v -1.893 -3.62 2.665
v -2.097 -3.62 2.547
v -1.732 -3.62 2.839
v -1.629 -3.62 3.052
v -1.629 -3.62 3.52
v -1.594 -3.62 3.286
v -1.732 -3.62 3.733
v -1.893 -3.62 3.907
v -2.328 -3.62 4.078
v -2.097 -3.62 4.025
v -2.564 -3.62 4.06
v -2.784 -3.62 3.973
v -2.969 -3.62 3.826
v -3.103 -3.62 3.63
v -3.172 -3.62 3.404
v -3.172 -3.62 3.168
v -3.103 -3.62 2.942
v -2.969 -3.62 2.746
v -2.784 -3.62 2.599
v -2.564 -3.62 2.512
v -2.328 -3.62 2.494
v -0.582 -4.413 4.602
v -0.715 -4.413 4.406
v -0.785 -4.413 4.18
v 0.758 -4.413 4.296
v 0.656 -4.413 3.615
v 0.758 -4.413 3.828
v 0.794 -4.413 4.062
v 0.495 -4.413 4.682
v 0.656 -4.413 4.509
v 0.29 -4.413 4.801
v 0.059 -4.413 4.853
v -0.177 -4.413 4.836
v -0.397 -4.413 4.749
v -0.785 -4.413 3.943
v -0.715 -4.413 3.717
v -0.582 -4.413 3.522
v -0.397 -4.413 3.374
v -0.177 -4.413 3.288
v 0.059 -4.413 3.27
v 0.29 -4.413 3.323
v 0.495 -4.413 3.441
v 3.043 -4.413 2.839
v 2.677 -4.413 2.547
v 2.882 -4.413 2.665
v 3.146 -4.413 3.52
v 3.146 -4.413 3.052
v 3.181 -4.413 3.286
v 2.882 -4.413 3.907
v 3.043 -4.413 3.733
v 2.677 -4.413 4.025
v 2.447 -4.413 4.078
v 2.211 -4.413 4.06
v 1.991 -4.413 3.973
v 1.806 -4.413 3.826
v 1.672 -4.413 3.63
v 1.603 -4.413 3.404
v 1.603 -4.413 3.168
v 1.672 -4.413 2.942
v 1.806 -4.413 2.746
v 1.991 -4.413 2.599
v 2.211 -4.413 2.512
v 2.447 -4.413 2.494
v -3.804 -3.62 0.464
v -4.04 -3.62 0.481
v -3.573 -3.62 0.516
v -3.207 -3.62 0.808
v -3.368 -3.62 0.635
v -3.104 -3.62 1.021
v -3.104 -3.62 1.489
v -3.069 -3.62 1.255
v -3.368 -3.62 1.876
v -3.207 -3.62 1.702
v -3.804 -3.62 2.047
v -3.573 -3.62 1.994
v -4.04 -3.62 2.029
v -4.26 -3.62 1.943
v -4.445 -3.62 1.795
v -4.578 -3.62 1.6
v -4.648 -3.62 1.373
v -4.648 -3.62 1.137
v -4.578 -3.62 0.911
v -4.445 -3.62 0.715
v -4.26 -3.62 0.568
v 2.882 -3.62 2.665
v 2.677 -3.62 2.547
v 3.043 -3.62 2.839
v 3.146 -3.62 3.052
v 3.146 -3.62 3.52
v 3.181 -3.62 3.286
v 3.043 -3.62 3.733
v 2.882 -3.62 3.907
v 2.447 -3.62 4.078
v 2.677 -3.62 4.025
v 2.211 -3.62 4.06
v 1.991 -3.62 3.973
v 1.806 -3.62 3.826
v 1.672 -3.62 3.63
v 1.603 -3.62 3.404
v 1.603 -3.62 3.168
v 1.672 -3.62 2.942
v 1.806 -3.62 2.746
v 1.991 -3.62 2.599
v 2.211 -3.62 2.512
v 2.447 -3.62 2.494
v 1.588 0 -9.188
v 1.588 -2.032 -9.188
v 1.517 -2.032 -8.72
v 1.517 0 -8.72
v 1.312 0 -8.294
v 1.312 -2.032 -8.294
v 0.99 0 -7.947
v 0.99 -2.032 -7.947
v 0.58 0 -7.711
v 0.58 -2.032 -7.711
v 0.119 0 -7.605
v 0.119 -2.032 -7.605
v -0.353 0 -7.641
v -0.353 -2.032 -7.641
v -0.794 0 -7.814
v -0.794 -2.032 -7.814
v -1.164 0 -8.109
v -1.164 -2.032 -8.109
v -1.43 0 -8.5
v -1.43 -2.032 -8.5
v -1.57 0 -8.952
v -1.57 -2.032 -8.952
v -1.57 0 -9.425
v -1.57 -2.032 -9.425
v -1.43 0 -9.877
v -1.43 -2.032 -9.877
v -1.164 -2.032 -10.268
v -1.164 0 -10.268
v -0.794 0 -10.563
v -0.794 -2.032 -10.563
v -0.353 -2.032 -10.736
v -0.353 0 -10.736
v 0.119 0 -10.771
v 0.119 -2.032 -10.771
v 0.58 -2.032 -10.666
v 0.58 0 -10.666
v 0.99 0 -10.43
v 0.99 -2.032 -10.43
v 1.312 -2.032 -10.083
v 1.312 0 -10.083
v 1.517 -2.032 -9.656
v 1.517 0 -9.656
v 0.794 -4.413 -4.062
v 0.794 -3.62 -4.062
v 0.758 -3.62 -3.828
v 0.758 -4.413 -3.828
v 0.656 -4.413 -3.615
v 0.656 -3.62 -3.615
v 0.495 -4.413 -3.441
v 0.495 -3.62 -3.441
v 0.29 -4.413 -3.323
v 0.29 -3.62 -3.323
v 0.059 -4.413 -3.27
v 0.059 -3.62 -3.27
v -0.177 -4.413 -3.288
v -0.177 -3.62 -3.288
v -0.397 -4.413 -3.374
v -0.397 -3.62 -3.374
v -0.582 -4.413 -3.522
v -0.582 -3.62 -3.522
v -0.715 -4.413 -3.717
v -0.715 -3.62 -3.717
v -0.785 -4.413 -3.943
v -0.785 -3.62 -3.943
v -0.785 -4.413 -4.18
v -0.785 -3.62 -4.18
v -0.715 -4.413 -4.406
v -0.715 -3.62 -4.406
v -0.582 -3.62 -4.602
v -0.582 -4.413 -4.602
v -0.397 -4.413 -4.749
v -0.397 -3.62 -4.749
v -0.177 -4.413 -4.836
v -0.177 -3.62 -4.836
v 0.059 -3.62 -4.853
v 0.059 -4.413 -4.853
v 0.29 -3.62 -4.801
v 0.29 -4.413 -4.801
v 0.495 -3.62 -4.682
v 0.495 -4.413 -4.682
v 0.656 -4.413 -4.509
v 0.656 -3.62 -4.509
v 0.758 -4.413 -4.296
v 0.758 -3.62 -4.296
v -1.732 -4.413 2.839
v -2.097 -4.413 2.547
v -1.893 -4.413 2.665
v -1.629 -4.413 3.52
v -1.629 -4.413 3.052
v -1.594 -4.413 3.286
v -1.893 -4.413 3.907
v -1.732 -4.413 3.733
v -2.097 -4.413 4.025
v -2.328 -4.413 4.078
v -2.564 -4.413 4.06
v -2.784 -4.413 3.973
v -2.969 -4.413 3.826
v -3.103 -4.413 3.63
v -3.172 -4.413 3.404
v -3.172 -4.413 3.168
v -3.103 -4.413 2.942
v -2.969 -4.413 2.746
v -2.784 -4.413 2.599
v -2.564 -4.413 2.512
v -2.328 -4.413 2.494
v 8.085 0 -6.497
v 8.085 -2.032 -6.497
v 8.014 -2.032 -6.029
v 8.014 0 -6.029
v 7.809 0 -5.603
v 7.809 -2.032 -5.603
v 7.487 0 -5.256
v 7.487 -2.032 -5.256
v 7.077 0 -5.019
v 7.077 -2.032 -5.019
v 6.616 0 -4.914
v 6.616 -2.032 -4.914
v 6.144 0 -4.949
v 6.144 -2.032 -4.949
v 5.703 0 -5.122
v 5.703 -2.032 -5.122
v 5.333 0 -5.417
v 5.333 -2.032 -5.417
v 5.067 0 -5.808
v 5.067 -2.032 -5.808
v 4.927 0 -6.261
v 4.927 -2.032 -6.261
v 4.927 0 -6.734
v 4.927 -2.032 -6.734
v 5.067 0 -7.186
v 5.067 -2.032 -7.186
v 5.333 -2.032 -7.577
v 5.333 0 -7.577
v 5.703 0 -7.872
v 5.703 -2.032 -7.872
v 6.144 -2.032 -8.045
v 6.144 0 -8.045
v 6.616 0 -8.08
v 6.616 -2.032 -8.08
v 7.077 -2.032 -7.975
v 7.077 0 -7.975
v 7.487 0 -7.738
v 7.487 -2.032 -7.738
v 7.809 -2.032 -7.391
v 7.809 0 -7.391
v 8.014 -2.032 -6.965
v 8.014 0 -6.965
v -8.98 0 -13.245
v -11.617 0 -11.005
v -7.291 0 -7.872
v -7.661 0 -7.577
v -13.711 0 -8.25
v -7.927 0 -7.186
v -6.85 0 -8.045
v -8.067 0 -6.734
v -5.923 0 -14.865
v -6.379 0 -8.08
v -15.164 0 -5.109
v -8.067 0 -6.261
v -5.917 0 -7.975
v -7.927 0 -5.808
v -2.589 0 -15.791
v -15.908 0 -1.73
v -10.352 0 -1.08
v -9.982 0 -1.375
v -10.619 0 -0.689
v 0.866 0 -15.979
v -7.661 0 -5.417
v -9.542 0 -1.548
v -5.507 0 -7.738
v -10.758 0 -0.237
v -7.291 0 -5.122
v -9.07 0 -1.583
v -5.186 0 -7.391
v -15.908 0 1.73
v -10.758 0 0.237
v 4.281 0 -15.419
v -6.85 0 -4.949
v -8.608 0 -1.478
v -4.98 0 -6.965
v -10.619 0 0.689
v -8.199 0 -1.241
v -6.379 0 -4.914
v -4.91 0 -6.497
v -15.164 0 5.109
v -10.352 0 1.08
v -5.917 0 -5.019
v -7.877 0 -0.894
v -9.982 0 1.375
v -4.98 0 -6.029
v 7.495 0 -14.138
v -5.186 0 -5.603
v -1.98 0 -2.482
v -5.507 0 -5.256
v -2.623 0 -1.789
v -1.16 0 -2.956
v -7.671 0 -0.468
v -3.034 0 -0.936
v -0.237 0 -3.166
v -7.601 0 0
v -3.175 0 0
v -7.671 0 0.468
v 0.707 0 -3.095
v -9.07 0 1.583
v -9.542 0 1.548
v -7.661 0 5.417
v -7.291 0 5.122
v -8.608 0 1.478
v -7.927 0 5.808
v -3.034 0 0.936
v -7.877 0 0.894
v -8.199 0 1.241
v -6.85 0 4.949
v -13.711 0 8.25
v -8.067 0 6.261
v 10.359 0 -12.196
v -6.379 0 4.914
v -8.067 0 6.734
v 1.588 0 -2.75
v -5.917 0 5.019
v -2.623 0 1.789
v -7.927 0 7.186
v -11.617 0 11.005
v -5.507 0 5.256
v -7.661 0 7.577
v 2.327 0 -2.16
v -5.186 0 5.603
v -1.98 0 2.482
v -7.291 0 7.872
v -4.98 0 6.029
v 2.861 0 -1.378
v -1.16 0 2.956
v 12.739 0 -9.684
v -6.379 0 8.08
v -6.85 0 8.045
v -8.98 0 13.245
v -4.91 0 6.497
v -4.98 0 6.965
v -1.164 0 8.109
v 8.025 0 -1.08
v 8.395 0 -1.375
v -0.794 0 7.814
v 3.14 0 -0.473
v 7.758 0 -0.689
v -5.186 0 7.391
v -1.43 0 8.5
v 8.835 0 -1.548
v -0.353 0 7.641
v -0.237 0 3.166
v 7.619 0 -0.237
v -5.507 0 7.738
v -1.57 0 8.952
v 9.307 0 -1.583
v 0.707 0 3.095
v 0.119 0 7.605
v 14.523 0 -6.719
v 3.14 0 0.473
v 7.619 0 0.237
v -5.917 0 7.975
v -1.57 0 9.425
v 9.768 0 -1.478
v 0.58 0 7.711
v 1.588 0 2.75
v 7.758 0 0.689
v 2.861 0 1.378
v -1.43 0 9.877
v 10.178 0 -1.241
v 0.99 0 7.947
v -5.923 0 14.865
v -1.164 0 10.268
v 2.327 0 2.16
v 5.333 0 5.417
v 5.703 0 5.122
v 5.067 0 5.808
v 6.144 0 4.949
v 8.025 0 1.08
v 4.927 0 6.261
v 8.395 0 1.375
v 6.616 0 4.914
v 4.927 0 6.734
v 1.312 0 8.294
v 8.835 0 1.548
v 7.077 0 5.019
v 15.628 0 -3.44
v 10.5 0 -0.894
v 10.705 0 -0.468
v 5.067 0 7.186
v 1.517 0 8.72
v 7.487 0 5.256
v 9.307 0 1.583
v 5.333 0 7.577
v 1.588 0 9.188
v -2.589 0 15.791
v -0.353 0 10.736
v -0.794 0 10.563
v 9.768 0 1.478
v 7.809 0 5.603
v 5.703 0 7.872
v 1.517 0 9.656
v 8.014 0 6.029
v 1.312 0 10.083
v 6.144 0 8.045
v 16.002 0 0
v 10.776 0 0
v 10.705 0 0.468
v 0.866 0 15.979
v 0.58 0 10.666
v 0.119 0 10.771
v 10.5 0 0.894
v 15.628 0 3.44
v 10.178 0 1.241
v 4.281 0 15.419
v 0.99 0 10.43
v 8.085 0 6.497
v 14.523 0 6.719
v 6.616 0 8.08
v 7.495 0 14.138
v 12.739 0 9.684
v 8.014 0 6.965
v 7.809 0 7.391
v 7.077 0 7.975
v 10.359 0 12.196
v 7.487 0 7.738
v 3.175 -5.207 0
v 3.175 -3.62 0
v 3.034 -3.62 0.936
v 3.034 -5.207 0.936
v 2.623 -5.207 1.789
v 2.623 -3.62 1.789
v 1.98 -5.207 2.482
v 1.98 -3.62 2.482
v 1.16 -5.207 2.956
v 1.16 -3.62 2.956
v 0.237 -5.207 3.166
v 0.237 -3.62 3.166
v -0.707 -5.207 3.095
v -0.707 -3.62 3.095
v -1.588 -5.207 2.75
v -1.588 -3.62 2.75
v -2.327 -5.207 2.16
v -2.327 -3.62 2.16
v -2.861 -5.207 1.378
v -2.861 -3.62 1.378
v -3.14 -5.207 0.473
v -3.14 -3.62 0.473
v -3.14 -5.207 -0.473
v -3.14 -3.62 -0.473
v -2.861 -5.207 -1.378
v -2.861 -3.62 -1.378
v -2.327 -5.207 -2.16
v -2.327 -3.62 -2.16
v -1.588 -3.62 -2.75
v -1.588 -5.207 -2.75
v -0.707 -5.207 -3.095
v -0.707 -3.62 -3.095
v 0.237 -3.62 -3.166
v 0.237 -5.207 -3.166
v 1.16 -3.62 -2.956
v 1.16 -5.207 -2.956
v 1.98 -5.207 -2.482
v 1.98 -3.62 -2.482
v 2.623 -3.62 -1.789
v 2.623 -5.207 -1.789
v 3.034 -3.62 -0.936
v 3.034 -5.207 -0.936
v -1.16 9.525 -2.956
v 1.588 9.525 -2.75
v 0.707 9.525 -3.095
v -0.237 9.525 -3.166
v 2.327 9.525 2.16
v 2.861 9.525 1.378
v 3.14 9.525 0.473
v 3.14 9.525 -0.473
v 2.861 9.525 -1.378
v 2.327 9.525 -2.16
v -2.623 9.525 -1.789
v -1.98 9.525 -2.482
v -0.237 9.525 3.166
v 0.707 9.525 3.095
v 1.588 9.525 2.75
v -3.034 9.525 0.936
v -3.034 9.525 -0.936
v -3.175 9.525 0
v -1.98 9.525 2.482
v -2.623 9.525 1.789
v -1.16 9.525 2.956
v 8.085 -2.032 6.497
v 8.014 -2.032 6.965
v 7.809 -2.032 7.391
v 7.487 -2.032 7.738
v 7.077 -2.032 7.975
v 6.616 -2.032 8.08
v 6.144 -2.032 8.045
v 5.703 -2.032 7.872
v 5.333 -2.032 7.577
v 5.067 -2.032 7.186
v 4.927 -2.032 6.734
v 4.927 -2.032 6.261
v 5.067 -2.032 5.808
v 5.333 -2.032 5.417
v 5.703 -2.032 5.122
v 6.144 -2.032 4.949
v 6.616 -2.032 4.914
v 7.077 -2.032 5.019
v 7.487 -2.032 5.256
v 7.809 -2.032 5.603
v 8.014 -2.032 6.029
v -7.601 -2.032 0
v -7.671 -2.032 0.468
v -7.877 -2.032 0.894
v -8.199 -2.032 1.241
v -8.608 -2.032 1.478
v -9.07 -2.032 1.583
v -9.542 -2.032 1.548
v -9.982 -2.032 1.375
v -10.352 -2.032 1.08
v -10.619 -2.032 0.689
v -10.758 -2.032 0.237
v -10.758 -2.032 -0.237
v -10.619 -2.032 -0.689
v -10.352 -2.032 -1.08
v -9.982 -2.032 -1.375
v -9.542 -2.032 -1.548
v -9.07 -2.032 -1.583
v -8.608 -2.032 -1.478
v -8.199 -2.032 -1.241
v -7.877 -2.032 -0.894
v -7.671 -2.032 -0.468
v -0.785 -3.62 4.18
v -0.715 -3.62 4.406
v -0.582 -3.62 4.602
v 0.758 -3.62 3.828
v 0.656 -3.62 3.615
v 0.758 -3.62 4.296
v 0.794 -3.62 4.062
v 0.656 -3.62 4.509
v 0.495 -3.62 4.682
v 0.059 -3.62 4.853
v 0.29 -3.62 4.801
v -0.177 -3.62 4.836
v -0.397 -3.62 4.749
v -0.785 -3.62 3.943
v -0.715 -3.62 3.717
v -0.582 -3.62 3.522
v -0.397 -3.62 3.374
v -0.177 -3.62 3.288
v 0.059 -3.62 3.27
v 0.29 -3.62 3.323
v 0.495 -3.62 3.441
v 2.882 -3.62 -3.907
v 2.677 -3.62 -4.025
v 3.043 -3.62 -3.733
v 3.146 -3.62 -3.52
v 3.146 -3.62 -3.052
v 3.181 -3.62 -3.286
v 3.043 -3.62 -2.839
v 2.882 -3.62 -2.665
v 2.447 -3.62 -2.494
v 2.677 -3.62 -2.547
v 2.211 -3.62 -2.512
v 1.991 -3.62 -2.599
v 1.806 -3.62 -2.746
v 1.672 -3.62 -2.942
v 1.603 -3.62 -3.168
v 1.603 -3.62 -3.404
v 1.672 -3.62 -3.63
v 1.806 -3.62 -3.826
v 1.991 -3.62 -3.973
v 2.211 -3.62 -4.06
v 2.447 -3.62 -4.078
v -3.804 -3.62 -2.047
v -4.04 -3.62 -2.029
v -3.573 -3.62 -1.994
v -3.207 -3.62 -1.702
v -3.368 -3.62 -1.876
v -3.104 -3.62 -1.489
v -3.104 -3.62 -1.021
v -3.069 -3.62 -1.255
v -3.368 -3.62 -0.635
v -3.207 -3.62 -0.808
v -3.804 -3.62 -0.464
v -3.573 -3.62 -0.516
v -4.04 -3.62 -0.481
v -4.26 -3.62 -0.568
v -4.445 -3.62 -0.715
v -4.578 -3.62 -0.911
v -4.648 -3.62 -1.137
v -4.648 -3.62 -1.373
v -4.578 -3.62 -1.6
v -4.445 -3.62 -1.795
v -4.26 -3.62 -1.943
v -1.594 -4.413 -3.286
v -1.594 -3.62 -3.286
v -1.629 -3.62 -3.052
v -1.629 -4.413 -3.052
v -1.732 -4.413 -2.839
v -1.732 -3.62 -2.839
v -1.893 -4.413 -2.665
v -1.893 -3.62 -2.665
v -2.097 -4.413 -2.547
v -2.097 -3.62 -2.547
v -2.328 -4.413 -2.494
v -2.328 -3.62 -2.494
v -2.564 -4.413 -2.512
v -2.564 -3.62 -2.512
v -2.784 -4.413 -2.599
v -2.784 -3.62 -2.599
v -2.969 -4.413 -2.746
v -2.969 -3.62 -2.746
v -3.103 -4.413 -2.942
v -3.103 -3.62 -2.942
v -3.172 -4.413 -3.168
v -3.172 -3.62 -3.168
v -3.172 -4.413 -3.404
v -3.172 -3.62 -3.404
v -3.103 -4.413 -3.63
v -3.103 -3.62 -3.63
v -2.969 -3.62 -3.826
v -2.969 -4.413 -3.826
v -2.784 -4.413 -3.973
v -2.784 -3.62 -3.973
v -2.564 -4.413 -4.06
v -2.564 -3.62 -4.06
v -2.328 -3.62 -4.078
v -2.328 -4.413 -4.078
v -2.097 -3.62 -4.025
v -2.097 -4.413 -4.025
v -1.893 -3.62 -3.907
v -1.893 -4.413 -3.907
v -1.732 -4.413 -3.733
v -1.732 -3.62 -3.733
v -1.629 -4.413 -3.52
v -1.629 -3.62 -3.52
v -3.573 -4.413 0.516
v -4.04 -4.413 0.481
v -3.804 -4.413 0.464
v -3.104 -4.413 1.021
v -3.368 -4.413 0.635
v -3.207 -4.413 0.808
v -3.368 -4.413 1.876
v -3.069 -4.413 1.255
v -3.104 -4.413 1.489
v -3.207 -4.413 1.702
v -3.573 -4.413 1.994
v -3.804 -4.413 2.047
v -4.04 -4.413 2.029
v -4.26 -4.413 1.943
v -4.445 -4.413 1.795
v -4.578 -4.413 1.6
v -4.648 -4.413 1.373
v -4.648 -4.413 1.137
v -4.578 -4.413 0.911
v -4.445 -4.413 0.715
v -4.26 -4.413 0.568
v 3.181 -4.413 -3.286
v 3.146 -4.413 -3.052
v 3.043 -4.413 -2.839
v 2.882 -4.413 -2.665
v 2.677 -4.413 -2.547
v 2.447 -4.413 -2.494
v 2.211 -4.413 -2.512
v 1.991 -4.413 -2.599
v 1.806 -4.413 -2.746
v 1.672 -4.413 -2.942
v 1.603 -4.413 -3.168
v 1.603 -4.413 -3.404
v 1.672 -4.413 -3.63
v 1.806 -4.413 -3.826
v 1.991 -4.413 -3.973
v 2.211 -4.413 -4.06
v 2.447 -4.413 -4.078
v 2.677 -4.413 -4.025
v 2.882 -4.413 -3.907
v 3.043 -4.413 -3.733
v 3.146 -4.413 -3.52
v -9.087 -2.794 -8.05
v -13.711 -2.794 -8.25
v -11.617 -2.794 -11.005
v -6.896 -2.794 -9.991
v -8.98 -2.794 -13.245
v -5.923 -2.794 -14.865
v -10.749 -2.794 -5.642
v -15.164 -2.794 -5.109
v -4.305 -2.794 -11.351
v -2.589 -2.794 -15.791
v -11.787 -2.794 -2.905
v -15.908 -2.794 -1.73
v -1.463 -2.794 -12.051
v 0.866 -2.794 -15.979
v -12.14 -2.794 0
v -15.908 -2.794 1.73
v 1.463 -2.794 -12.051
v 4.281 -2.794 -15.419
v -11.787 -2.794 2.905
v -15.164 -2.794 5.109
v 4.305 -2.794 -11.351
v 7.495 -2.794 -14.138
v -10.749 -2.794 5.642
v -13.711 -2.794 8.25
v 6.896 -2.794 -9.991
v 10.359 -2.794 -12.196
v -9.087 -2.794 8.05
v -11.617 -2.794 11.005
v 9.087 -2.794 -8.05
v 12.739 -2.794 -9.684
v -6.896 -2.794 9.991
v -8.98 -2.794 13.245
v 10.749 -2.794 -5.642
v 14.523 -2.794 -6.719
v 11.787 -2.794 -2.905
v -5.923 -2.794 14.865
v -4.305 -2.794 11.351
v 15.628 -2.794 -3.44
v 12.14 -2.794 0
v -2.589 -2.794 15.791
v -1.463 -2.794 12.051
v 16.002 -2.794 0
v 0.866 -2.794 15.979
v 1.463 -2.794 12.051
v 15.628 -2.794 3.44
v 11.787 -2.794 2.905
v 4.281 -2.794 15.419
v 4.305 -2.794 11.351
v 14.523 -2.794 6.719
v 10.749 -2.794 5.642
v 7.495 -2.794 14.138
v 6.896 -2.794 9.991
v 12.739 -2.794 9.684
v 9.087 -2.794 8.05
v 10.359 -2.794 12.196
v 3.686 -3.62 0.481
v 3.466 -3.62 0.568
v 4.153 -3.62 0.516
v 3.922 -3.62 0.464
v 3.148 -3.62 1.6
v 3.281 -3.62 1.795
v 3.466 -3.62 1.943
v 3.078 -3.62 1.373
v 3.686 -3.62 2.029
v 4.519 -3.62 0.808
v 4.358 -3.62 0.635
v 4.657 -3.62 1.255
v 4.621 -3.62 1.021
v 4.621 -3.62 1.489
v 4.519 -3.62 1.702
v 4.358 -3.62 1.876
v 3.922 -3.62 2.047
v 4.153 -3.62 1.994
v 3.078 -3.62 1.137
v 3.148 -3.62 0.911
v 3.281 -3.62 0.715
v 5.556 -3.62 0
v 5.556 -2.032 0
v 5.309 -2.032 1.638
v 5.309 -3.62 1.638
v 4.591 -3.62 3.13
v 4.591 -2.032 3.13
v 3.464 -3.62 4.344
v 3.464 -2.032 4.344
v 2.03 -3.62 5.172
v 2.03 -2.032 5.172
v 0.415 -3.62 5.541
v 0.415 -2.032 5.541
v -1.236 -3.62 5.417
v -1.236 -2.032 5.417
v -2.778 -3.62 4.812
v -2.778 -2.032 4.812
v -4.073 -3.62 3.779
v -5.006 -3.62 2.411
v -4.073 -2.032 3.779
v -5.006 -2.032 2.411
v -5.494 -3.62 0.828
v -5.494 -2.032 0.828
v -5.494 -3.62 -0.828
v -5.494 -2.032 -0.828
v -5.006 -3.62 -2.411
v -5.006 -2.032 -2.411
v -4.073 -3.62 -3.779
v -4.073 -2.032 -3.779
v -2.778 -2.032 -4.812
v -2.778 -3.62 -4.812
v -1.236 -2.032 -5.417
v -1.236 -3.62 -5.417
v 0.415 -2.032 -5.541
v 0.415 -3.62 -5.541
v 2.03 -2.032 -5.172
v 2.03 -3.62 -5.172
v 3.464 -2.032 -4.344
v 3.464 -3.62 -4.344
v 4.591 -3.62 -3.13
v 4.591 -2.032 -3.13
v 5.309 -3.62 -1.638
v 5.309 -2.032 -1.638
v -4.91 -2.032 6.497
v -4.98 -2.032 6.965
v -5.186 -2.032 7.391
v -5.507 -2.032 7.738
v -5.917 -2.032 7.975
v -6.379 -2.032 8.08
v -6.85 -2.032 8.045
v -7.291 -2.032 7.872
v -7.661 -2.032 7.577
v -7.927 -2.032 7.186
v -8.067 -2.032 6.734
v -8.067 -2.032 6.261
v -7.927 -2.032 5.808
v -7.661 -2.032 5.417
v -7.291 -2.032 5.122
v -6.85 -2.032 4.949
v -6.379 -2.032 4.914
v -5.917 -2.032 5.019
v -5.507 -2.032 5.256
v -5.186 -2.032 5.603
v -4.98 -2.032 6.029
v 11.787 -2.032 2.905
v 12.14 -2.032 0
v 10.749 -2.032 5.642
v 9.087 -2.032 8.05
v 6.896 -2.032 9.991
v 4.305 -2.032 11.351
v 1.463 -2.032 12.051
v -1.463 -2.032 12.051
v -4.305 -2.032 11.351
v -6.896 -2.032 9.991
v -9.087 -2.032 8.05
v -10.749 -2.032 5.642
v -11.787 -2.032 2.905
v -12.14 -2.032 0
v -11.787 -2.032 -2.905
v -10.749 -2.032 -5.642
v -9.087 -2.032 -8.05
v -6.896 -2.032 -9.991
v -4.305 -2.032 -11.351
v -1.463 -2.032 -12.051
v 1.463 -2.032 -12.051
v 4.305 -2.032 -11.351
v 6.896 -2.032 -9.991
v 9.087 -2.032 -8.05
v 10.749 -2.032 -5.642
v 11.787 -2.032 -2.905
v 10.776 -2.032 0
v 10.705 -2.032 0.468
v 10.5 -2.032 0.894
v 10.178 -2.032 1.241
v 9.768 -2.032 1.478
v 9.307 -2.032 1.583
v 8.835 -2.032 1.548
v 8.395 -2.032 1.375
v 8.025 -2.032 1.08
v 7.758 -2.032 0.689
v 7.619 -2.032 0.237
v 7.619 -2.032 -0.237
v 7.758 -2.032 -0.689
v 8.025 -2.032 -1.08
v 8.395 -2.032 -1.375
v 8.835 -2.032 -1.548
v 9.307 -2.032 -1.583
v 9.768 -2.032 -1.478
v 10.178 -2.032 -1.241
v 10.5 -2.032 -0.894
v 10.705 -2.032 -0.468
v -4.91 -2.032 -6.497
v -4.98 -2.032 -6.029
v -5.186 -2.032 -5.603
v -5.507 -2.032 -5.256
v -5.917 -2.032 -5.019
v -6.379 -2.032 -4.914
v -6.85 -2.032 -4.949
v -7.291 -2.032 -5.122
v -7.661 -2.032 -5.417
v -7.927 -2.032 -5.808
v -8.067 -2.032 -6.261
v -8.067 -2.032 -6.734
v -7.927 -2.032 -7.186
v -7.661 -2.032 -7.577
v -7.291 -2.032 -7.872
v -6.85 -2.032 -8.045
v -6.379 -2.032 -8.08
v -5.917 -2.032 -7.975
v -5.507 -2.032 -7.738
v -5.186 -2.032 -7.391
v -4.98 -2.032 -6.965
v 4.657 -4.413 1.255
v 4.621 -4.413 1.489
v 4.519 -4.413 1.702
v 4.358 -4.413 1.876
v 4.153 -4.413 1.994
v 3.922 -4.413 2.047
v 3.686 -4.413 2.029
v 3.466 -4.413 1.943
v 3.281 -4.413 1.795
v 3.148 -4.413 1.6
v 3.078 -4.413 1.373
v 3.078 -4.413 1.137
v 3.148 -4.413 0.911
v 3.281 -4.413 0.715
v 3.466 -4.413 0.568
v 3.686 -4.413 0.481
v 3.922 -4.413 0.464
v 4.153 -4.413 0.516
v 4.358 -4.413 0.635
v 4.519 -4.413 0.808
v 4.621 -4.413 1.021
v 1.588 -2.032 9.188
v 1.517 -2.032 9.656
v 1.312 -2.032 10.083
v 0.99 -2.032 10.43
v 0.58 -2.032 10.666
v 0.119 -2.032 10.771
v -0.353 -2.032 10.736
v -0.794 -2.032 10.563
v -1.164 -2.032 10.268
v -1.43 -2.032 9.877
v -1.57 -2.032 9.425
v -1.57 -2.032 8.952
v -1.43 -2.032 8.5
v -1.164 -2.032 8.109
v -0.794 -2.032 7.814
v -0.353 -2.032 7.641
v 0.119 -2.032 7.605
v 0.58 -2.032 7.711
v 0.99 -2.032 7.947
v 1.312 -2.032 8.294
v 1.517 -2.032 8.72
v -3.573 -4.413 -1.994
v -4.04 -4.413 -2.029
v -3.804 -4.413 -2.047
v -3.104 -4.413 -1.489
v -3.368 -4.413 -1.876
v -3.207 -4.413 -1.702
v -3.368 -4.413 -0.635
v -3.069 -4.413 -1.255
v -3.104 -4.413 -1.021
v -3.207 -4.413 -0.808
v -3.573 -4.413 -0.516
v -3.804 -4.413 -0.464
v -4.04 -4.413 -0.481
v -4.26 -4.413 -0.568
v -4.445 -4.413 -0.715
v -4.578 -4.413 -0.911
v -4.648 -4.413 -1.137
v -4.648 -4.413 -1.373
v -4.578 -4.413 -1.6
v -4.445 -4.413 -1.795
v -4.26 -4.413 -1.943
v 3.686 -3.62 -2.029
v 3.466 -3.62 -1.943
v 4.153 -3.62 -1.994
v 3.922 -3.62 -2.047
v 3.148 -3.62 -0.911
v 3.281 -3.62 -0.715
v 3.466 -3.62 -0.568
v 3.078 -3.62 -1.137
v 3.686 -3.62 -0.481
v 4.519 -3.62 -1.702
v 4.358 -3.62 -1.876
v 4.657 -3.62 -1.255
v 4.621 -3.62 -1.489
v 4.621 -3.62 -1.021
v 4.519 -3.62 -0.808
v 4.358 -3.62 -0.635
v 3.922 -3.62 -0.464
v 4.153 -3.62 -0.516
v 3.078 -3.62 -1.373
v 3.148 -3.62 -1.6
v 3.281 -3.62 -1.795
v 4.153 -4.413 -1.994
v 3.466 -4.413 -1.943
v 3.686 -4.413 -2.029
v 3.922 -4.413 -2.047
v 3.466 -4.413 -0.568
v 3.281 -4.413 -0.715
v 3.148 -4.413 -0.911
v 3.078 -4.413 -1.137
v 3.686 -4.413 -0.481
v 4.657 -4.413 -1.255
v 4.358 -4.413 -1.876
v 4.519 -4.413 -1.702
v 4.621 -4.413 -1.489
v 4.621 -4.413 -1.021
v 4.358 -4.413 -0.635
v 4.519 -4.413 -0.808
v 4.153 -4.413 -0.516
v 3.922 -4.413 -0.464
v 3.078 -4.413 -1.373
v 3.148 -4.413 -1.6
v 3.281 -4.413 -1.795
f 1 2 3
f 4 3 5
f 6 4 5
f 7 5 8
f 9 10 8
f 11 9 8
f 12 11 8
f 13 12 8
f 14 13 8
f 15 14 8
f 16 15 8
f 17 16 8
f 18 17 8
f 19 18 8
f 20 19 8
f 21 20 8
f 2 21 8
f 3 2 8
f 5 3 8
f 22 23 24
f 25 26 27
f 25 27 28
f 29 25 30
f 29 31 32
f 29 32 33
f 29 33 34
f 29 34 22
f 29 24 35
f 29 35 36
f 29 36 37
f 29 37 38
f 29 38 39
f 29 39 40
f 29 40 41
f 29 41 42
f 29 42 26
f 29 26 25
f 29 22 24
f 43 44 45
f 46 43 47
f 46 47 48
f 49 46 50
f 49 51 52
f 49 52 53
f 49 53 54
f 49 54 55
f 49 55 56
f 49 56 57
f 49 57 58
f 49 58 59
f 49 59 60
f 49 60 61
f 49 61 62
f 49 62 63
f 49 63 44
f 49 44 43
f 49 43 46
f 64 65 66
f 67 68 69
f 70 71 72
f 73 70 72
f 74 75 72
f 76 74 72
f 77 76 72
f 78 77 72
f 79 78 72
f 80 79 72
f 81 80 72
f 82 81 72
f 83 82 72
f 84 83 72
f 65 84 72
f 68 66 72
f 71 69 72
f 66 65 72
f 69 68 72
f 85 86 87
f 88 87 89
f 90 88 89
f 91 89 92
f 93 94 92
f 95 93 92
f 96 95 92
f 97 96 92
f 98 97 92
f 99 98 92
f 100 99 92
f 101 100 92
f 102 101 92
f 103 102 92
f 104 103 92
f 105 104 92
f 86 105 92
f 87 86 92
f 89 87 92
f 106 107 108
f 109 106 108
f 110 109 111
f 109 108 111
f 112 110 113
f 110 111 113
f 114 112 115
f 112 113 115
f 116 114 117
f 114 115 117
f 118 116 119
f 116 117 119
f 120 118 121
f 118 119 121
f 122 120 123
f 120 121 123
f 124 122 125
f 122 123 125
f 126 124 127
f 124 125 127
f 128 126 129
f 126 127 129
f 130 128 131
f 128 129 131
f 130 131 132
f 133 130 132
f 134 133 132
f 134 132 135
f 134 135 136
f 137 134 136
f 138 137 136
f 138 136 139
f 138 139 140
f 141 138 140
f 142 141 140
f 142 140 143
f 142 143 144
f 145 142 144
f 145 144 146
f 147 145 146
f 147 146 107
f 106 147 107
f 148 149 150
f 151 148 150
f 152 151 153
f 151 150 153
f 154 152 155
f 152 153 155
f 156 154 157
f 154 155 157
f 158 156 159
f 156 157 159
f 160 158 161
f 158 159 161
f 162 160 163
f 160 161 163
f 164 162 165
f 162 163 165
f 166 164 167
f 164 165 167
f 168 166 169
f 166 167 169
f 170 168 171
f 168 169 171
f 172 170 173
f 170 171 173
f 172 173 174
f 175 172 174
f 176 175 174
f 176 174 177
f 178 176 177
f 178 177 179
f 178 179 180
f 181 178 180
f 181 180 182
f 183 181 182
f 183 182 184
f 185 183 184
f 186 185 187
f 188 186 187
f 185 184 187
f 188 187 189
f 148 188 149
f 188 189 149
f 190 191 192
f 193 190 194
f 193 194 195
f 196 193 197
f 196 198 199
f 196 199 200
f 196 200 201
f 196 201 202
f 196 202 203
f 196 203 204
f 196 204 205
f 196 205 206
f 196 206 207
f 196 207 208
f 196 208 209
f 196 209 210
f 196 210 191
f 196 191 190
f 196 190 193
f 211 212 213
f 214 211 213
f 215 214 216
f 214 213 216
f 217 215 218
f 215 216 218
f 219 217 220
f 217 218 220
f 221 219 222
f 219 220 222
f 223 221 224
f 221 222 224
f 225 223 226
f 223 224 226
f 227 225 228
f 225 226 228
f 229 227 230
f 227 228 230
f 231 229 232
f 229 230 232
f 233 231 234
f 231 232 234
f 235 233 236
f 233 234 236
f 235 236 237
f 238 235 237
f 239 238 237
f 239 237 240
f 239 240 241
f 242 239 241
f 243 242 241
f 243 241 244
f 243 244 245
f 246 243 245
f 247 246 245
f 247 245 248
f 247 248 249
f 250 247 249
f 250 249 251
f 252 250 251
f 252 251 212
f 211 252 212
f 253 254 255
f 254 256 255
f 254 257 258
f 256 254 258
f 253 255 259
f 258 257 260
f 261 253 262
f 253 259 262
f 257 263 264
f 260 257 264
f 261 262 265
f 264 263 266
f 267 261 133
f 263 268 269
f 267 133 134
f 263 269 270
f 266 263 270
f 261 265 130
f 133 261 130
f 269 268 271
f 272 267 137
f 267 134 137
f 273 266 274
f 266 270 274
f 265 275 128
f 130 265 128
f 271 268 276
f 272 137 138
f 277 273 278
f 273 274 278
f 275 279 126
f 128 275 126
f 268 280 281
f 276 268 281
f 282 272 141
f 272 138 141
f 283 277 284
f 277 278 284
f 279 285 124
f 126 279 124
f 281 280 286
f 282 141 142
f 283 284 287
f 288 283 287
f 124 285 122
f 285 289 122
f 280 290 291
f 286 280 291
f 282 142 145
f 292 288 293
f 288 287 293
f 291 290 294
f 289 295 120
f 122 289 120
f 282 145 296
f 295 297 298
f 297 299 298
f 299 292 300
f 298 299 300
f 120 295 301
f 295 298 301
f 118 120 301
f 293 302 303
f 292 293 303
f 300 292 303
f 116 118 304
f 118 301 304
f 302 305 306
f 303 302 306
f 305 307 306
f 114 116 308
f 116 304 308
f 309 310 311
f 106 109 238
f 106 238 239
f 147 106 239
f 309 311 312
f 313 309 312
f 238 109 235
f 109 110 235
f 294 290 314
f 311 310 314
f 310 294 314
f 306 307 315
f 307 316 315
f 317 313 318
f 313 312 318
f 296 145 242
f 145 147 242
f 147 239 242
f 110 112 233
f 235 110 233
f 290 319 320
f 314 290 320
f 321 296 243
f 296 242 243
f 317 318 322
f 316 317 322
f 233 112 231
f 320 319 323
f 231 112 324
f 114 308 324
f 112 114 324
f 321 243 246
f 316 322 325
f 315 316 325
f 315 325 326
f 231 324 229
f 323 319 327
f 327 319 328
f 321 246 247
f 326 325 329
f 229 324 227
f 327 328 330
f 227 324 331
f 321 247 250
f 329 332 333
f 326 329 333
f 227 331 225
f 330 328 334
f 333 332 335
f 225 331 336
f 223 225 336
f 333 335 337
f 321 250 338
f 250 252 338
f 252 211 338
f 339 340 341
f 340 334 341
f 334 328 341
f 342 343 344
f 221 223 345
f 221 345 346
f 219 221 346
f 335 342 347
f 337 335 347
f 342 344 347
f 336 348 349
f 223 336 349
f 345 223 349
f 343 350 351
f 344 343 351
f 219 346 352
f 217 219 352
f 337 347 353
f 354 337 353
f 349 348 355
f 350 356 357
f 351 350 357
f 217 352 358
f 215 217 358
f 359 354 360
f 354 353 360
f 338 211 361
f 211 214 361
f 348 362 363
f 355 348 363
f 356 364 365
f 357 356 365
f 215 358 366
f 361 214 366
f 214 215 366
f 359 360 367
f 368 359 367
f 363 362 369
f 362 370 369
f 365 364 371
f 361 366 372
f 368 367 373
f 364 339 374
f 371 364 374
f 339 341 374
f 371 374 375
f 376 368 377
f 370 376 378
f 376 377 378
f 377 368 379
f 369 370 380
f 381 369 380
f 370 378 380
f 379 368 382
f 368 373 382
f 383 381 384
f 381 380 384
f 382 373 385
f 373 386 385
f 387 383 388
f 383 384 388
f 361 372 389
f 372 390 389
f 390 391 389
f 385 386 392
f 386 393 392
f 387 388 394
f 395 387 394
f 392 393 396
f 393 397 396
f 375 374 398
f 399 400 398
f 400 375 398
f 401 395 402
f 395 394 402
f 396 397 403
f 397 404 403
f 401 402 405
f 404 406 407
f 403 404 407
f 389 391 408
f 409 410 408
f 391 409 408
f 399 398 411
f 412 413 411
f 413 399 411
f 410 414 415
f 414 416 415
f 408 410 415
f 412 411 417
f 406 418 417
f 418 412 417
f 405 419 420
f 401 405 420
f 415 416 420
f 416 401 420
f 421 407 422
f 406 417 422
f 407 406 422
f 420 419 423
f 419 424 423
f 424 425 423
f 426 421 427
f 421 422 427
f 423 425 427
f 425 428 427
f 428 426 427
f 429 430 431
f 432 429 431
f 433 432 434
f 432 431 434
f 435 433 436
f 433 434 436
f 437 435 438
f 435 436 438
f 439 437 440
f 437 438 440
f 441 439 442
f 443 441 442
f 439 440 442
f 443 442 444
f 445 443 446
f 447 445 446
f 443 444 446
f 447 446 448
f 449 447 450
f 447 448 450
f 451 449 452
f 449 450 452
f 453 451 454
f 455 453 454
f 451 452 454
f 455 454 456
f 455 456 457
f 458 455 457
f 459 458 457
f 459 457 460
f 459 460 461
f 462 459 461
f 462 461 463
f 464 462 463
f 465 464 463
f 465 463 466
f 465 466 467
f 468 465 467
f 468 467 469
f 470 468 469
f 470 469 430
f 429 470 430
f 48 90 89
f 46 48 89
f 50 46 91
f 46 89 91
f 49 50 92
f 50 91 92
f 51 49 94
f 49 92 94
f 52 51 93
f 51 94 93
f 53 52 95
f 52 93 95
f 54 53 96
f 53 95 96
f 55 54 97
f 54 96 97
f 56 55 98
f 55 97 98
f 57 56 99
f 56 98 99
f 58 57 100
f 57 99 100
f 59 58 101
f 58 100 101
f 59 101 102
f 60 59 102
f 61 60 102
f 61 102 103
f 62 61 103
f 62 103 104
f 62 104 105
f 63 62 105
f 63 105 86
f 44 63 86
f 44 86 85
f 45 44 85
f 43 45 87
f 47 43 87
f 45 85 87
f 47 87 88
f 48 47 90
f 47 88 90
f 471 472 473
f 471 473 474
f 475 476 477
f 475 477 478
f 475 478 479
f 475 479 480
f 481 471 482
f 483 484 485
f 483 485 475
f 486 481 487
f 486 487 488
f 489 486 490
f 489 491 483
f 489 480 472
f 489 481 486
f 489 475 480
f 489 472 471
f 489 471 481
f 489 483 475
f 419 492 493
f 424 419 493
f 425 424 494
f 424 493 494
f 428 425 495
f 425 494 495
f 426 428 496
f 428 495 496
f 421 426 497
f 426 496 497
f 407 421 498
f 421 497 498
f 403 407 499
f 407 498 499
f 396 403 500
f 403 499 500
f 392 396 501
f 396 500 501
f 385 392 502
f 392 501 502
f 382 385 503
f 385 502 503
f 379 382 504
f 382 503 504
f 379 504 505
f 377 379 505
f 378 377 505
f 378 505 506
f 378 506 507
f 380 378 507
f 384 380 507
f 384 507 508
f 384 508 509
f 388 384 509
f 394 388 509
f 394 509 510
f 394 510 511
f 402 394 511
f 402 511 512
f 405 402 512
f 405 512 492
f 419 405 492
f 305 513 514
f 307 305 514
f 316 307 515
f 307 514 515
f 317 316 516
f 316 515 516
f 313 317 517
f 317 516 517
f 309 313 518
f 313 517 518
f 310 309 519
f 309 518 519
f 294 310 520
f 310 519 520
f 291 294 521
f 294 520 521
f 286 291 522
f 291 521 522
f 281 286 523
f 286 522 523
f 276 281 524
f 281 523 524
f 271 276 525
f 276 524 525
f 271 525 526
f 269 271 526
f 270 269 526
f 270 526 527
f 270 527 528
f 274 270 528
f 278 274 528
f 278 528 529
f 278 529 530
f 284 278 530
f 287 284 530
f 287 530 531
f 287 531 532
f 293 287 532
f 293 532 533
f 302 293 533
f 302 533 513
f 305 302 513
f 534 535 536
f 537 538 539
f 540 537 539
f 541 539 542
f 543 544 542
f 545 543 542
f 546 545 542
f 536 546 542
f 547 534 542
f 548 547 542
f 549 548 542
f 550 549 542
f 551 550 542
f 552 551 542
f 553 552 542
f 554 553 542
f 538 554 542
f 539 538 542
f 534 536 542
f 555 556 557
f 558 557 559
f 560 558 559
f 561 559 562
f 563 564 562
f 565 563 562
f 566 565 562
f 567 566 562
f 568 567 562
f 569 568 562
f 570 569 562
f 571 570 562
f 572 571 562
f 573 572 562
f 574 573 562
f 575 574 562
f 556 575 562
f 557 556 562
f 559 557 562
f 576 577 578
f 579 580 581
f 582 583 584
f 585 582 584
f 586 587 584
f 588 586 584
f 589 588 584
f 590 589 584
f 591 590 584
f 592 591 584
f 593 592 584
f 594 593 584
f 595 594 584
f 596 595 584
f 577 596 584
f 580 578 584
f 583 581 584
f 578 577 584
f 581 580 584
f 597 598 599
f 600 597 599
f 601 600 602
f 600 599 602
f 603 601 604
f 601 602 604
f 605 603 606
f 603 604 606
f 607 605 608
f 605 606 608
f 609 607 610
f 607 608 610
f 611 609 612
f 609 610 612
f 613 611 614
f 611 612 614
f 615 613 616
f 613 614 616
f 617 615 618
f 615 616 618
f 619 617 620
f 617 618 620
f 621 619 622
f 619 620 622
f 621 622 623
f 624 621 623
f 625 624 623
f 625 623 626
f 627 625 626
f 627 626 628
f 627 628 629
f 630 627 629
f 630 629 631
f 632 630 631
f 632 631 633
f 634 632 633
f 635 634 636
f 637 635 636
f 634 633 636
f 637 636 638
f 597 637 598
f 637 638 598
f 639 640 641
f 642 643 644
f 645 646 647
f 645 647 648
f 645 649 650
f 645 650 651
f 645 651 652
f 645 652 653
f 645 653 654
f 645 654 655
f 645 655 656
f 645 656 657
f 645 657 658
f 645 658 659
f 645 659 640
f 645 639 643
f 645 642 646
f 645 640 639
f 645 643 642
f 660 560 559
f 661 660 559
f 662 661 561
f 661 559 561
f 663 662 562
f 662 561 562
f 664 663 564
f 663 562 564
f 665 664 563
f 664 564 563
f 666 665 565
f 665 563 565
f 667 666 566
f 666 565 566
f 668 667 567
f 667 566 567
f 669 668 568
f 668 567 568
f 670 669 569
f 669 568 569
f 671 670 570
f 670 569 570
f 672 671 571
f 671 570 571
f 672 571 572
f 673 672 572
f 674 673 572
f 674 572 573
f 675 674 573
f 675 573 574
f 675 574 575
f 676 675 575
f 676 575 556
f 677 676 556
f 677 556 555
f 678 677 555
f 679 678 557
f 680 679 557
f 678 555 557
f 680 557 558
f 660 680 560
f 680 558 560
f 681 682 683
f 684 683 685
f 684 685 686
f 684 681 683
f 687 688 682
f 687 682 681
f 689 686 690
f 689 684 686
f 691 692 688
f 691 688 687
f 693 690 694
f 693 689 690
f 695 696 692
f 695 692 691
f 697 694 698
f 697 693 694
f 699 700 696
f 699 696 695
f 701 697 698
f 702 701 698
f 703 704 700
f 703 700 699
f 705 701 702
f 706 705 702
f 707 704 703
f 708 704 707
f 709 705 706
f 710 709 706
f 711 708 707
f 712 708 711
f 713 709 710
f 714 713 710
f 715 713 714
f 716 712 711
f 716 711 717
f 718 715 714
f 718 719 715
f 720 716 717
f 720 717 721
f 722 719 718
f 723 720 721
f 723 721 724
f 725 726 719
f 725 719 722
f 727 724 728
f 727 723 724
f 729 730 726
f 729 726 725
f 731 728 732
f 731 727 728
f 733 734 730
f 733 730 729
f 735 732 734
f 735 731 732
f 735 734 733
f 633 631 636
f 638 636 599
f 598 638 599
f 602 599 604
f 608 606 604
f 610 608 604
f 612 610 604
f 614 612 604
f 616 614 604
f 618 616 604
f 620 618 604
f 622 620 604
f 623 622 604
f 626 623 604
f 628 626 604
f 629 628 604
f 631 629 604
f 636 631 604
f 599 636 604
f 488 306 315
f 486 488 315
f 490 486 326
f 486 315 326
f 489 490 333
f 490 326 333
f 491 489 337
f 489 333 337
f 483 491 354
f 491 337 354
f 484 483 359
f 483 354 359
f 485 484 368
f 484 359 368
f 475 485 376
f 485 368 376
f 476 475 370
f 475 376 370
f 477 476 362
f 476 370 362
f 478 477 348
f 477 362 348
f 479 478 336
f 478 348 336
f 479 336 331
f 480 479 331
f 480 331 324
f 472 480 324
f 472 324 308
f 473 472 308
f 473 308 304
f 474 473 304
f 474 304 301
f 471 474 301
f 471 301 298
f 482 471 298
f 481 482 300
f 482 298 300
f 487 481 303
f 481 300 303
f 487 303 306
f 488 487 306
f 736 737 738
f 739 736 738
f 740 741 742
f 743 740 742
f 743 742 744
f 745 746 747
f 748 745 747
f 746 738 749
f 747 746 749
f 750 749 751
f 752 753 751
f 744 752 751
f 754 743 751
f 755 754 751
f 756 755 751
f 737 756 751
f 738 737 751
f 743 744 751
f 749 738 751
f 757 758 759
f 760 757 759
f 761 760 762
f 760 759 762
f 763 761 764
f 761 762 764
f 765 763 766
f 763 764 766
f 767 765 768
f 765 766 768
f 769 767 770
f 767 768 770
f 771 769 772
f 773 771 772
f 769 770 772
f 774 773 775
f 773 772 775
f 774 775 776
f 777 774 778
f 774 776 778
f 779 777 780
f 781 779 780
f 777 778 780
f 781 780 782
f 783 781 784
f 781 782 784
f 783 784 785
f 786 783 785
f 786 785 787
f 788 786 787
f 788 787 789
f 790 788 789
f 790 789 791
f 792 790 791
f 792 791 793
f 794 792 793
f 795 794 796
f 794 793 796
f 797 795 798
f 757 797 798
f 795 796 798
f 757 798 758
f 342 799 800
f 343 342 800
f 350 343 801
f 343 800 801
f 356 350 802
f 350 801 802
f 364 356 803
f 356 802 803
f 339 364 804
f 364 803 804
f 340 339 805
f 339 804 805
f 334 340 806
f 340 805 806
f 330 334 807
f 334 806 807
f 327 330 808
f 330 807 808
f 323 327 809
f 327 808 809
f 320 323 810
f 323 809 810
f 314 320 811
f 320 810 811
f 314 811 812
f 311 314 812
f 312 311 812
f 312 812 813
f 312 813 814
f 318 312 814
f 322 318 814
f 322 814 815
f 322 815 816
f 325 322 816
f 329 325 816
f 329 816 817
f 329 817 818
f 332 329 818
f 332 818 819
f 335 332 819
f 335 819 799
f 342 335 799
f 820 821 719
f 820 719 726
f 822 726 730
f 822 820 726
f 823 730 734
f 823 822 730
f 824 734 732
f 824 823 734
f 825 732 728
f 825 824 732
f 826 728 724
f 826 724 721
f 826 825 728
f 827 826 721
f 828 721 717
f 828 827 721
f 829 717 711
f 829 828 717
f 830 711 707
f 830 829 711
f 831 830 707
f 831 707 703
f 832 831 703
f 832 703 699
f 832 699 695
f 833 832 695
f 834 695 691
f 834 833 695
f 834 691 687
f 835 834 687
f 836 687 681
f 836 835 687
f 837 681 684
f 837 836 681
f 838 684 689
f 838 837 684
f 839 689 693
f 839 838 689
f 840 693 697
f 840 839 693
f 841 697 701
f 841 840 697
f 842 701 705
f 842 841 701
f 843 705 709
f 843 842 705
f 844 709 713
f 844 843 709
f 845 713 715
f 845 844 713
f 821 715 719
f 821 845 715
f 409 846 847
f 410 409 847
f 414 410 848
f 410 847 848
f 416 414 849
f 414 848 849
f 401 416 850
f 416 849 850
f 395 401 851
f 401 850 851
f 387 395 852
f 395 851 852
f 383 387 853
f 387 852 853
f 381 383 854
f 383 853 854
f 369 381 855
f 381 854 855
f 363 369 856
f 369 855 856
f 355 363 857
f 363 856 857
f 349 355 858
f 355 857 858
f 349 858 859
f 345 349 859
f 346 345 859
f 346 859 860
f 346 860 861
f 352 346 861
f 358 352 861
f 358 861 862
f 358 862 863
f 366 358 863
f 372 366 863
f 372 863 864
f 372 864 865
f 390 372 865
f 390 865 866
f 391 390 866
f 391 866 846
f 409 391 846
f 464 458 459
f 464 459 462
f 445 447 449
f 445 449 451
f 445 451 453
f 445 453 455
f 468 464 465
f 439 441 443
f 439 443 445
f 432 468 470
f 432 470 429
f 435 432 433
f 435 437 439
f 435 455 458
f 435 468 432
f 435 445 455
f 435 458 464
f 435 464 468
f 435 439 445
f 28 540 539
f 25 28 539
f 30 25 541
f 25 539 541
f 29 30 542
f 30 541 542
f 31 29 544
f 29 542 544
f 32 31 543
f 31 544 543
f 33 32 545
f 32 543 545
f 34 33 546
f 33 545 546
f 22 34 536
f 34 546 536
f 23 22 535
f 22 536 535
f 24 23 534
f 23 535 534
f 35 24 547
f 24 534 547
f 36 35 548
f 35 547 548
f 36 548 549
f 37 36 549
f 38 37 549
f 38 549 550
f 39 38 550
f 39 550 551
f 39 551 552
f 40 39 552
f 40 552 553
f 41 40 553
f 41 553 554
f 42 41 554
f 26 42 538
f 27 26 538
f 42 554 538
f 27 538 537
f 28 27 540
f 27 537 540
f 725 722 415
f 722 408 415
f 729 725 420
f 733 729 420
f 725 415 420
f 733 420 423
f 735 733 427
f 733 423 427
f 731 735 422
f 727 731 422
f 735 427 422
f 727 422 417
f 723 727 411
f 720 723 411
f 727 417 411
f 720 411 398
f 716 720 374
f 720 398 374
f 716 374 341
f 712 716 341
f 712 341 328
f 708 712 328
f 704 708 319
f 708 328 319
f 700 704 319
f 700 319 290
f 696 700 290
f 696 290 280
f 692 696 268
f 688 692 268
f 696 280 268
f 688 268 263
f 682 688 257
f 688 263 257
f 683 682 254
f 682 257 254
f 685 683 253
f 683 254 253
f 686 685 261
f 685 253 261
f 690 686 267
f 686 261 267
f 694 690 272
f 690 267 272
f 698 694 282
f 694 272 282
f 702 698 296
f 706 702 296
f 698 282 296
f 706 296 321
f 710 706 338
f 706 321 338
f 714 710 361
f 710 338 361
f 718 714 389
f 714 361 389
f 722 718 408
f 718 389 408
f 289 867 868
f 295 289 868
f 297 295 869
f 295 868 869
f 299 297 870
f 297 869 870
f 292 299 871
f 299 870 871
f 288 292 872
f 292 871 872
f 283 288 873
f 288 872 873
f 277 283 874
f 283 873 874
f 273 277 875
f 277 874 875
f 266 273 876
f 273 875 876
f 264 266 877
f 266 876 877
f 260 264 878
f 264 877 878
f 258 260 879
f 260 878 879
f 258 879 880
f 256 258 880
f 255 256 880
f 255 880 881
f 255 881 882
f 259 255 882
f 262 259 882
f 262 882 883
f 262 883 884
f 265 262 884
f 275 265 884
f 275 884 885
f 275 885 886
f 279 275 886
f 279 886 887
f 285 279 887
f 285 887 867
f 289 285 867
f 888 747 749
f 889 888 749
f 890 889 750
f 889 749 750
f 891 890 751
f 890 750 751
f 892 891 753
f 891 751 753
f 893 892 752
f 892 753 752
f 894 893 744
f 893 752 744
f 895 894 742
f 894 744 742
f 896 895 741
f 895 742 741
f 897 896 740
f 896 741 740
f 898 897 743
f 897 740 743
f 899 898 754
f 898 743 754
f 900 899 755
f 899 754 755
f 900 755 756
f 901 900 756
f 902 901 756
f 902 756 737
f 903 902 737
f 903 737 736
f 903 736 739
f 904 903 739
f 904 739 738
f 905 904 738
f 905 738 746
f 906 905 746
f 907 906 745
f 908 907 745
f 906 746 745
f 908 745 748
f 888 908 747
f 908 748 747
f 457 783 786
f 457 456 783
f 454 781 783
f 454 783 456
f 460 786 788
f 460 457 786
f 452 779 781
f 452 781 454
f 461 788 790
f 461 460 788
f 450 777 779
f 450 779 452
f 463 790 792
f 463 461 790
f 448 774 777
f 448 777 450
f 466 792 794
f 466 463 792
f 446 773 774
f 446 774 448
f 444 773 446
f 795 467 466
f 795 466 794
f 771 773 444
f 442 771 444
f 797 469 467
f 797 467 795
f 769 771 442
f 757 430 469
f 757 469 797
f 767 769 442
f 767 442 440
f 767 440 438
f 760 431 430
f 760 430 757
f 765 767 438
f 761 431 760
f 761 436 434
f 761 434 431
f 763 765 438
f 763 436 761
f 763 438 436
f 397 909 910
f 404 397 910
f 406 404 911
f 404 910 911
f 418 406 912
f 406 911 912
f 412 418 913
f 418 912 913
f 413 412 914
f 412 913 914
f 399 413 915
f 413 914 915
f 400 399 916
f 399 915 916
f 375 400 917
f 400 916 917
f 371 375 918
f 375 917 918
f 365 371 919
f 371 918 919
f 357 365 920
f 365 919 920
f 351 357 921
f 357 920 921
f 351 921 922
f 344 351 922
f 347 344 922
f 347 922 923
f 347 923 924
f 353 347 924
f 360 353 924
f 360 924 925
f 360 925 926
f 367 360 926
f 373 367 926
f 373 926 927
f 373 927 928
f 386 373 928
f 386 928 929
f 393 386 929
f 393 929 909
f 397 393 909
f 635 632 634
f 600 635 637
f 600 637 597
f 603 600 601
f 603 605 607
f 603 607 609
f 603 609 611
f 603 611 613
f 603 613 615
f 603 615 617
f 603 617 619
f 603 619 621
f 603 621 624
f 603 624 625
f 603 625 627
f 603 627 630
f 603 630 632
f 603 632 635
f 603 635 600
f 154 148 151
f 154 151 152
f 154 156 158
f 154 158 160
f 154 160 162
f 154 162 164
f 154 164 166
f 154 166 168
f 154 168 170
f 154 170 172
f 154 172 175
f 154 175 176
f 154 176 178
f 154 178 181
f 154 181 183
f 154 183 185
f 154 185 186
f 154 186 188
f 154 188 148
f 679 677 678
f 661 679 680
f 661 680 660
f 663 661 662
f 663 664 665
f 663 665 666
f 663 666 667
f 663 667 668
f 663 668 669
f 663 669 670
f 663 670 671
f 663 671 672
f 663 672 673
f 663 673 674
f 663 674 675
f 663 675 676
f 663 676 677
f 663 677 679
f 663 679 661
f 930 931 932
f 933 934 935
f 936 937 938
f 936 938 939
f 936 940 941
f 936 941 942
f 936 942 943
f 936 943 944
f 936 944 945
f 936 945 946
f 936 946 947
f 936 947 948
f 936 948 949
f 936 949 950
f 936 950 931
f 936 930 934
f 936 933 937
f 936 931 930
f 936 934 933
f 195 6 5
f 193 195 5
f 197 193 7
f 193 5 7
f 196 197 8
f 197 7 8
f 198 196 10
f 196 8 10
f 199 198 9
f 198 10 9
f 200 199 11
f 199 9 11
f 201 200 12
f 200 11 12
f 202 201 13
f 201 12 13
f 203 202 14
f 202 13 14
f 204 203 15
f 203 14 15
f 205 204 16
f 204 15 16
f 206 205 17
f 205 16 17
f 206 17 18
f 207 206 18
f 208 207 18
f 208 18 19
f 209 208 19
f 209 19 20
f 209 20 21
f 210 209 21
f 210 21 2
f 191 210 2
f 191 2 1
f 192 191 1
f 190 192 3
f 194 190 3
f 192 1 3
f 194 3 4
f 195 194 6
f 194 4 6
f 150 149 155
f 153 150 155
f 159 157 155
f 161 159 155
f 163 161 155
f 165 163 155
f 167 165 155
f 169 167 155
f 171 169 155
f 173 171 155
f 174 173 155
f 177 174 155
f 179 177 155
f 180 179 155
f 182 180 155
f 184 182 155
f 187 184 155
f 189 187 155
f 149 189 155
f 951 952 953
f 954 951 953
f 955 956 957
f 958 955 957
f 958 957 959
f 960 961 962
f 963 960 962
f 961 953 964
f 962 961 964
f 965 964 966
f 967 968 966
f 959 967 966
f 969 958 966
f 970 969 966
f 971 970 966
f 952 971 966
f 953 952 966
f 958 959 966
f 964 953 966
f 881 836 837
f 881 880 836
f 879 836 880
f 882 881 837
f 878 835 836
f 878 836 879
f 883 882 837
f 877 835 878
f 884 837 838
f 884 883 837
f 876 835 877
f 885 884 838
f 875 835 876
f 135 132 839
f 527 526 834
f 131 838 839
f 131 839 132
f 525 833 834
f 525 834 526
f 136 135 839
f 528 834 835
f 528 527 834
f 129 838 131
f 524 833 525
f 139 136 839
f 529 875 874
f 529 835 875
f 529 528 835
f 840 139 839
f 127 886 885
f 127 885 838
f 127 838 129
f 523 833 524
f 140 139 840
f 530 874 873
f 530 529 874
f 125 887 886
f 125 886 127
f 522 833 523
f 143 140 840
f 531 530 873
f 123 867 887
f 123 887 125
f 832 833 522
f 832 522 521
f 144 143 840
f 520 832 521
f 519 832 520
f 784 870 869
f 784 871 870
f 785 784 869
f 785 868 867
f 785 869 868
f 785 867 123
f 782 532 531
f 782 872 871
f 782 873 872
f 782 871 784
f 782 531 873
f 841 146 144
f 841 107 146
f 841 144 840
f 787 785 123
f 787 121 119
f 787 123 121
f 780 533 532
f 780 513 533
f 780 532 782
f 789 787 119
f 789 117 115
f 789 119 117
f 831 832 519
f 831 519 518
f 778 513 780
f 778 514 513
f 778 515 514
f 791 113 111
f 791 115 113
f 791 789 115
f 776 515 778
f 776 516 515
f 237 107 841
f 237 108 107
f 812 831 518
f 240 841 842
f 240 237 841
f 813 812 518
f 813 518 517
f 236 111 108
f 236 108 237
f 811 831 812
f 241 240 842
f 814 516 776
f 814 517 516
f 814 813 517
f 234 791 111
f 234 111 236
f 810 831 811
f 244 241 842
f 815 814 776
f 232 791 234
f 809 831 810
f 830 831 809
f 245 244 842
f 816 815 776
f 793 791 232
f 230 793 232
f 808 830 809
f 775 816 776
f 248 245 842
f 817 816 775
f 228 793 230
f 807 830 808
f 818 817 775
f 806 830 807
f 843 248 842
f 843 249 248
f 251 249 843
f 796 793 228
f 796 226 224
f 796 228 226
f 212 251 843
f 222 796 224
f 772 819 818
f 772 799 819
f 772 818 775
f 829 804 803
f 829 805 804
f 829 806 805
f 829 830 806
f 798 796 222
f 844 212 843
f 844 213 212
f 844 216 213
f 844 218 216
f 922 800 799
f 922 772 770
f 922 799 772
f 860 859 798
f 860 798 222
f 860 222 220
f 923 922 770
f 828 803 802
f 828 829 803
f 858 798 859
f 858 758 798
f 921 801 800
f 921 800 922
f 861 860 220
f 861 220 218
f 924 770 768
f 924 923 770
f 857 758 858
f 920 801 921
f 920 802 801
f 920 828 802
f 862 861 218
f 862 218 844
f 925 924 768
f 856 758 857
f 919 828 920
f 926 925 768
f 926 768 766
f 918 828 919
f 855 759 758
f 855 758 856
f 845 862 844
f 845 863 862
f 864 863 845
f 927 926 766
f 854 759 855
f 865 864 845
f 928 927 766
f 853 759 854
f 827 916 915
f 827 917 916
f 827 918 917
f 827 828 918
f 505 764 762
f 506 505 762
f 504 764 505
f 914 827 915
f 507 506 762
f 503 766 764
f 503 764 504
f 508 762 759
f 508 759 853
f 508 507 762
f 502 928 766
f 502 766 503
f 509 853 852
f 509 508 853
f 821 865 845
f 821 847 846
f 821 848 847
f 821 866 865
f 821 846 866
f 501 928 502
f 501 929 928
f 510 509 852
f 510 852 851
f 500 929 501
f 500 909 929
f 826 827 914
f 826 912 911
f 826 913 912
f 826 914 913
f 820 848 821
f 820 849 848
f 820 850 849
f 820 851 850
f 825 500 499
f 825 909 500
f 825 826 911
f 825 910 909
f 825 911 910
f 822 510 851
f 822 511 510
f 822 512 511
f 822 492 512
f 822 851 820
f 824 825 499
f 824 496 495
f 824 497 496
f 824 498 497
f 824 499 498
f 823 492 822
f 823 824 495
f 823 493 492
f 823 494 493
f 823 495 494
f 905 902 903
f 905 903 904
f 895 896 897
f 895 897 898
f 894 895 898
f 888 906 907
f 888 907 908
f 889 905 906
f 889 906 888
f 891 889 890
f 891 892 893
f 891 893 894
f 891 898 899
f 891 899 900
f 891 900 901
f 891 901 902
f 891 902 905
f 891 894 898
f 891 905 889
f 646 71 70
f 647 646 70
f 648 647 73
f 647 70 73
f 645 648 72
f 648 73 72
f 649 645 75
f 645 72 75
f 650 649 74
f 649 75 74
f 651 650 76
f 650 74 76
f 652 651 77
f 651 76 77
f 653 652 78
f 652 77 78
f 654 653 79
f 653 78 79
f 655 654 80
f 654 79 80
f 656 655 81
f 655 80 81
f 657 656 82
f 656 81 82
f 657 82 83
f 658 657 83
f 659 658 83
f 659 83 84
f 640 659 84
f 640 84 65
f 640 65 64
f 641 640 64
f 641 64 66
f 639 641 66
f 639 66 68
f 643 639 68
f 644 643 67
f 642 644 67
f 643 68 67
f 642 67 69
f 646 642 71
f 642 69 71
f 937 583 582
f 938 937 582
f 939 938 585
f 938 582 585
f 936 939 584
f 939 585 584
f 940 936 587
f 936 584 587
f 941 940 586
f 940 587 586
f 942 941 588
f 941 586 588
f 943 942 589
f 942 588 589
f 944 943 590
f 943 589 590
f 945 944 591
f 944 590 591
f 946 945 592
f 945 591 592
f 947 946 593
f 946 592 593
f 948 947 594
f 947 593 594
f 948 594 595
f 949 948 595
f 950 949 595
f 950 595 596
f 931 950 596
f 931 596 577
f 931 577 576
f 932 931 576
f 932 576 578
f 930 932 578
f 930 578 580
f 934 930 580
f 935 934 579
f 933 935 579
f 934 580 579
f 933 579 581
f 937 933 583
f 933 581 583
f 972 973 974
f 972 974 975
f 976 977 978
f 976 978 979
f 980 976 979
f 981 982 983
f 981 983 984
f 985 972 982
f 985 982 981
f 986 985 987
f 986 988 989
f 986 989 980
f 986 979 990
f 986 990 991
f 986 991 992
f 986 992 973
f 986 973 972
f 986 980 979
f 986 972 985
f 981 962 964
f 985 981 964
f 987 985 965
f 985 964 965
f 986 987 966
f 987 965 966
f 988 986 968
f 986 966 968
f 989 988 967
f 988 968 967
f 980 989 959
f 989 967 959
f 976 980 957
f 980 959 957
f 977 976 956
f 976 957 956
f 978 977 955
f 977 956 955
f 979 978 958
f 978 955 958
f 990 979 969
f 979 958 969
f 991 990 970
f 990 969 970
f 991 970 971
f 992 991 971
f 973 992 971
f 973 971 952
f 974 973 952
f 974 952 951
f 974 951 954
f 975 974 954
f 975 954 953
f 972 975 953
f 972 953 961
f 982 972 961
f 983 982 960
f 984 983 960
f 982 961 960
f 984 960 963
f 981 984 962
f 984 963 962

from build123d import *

# Parameters (mm, degrees)
F0_R      = 16.002
F1_DEPTH  = 2.032
F2_R      = 1.5875
F3_DEPTH  = 20.32
F5_R      = 3.175
F6_DEPTH  = 3.175
F4_R      = 5.55625
F7_DEPTH  = 1.5875
F8_R      = 0.79375
F9_DEPTH  = 0.79375
F10_R     = 3.175
F11_DEPTH = 9.525
F12_R     = 16.002
F12_R_2   = 12.139806815
F13_DEPTH = 0.762


with BuildPart() as f1:
    # F0 (on Front) → F1 (new body)
    with BuildSketch(Plane.XZ):
        Circle(F0_R)
    extrude(amount=F1_DEPTH)

    # F2 (on face) → F3 (cut)
    with BuildSketch(Plane.XZ.offset(2.032)):
        with Locations((0, 9.1884150909)):
            Circle(F2_R)
        with Locations((6.4971906191, 6.4971906191)):
            Circle(F2_R)
        with Locations((9.1884150909, 0)):
            Circle(F2_R)
        with Locations((6.4971906191, -6.4971906191)):
            Circle(F2_R)
        with Locations((0, -9.1884150909)):
            Circle(F2_R)
        with Locations((-6.4971906191, -6.4971906191)):
            Circle(F2_R)
        with Locations((-9.1884150909, 0)):
            Circle(F2_R)
        with Locations((-6.4971906191, 6.4971906191)):
            Circle(F2_R)
    extrude(amount=-F3_DEPTH, mode=Mode.SUBTRACT)

    # F5 (on face) → F6 (join)
    with BuildSketch(Plane.XZ.offset(2.032)):
        Circle(F5_R)
    extrude(amount=F6_DEPTH)

    # F4 (on face) → F7 (join)
    with BuildSketch(Plane.XZ.offset(2.032)):
        Circle(F4_R)
    extrude(amount=F7_DEPTH)

    # F10 (on face) → F11 (join)
    with BuildSketch(Plane(origin=(0, 0, 0), x_dir=(-1, 0, 0), z_dir=(0, 1, 0))):
        Circle(F10_R)
    extrude(amount=F11_DEPTH)

    # F12 (on face) → F13 (join)
    with BuildSketch(Plane.XZ.offset(2.032)):
        Circle(F12_R)
        Circle(F12_R_2, mode=Mode.SUBTRACT)
    extrude(amount=F13_DEPTH)


with BuildPart() as f9:
    # F8 (on face) → F9 (new body)
    with BuildSketch(Plane.XZ.offset(3.6195)):
        with Locations((0, 4.0617209223)):
            Circle(F8_R)
    extrude(amount=F9_DEPTH)


with BuildPart() as f9b:
    # F8 (on face) → F9, piece 2 (new body)
    with BuildSketch(Plane.XZ.offset(3.6195)):
        with Locations((2.387419657, 3.2860012525)):
            Circle(F8_R)
    extrude(amount=F9_DEPTH)


with BuildPart() as f9c:
    # F8 (on face) → F9, piece 3 (new body)
    with BuildSketch(Plane.XZ.offset(3.6195)):
        with Locations((3.8629261505, 1.2551407914)):
            Circle(F8_R)
    extrude(amount=F9_DEPTH)


with BuildPart() as f9d:
    # F8 (on face) → F9, piece 4 (new body)
    with BuildSketch(Plane.XZ.offset(3.6195)):
        with Locations((3.8629261505, -1.2551407914)):
            Circle(F8_R)
    extrude(amount=F9_DEPTH)


with BuildPart() as f9e:
    # F8 (on face) → F9, piece 5 (new body)
    with BuildSketch(Plane.XZ.offset(3.6195)):
        with Locations((2.387419657, -3.2860012525)):
            Circle(F8_R)
    extrude(amount=F9_DEPTH)


with BuildPart() as f9f:
    # F8 (on face) → F9, piece 6 (new body)
    with BuildSketch(Plane.XZ.offset(3.6195)):
        with Locations((0, -4.0617209223)):
            Circle(F8_R)
    extrude(amount=F9_DEPTH)


with BuildPart() as f9g:
    # F8 (on face) → F9, piece 7 (new body)
    with BuildSketch(Plane.XZ.offset(3.6195)):
        with Locations((-2.387419657, -3.2860012525)):
            Circle(F8_R)
    extrude(amount=F9_DEPTH)


with BuildPart() as f9h:
    # F8 (on face) → F9, piece 8 (new body)
    with BuildSketch(Plane.XZ.offset(3.6195)):
        with Locations((-3.8629261505, -1.2551407914)):
            Circle(F8_R)
    extrude(amount=F9_DEPTH)


with BuildPart() as f9i:
    # F8 (on face) → F9, piece 9 (new body)
    with BuildSketch(Plane.XZ.offset(3.6195)):
        with Locations((-3.8629261505, 1.2551407914)):
            Circle(F8_R)
    extrude(amount=F9_DEPTH)


with BuildPart() as f9j:
    # F8 (on face) → F9, piece 10 (new body)
    with BuildSketch(Plane.XZ.offset(3.6195)):
        with Locations((-2.387419657, 3.2860012525)):
            Circle(F8_R)
    extrude(amount=F9_DEPTH)


solid = Compound([f1.part, f9.part, f9b.part, f9c.part, f9d.part, f9e.part, f9f.part, f9g.part, f9h.part, f9i.part, f9j.part])
